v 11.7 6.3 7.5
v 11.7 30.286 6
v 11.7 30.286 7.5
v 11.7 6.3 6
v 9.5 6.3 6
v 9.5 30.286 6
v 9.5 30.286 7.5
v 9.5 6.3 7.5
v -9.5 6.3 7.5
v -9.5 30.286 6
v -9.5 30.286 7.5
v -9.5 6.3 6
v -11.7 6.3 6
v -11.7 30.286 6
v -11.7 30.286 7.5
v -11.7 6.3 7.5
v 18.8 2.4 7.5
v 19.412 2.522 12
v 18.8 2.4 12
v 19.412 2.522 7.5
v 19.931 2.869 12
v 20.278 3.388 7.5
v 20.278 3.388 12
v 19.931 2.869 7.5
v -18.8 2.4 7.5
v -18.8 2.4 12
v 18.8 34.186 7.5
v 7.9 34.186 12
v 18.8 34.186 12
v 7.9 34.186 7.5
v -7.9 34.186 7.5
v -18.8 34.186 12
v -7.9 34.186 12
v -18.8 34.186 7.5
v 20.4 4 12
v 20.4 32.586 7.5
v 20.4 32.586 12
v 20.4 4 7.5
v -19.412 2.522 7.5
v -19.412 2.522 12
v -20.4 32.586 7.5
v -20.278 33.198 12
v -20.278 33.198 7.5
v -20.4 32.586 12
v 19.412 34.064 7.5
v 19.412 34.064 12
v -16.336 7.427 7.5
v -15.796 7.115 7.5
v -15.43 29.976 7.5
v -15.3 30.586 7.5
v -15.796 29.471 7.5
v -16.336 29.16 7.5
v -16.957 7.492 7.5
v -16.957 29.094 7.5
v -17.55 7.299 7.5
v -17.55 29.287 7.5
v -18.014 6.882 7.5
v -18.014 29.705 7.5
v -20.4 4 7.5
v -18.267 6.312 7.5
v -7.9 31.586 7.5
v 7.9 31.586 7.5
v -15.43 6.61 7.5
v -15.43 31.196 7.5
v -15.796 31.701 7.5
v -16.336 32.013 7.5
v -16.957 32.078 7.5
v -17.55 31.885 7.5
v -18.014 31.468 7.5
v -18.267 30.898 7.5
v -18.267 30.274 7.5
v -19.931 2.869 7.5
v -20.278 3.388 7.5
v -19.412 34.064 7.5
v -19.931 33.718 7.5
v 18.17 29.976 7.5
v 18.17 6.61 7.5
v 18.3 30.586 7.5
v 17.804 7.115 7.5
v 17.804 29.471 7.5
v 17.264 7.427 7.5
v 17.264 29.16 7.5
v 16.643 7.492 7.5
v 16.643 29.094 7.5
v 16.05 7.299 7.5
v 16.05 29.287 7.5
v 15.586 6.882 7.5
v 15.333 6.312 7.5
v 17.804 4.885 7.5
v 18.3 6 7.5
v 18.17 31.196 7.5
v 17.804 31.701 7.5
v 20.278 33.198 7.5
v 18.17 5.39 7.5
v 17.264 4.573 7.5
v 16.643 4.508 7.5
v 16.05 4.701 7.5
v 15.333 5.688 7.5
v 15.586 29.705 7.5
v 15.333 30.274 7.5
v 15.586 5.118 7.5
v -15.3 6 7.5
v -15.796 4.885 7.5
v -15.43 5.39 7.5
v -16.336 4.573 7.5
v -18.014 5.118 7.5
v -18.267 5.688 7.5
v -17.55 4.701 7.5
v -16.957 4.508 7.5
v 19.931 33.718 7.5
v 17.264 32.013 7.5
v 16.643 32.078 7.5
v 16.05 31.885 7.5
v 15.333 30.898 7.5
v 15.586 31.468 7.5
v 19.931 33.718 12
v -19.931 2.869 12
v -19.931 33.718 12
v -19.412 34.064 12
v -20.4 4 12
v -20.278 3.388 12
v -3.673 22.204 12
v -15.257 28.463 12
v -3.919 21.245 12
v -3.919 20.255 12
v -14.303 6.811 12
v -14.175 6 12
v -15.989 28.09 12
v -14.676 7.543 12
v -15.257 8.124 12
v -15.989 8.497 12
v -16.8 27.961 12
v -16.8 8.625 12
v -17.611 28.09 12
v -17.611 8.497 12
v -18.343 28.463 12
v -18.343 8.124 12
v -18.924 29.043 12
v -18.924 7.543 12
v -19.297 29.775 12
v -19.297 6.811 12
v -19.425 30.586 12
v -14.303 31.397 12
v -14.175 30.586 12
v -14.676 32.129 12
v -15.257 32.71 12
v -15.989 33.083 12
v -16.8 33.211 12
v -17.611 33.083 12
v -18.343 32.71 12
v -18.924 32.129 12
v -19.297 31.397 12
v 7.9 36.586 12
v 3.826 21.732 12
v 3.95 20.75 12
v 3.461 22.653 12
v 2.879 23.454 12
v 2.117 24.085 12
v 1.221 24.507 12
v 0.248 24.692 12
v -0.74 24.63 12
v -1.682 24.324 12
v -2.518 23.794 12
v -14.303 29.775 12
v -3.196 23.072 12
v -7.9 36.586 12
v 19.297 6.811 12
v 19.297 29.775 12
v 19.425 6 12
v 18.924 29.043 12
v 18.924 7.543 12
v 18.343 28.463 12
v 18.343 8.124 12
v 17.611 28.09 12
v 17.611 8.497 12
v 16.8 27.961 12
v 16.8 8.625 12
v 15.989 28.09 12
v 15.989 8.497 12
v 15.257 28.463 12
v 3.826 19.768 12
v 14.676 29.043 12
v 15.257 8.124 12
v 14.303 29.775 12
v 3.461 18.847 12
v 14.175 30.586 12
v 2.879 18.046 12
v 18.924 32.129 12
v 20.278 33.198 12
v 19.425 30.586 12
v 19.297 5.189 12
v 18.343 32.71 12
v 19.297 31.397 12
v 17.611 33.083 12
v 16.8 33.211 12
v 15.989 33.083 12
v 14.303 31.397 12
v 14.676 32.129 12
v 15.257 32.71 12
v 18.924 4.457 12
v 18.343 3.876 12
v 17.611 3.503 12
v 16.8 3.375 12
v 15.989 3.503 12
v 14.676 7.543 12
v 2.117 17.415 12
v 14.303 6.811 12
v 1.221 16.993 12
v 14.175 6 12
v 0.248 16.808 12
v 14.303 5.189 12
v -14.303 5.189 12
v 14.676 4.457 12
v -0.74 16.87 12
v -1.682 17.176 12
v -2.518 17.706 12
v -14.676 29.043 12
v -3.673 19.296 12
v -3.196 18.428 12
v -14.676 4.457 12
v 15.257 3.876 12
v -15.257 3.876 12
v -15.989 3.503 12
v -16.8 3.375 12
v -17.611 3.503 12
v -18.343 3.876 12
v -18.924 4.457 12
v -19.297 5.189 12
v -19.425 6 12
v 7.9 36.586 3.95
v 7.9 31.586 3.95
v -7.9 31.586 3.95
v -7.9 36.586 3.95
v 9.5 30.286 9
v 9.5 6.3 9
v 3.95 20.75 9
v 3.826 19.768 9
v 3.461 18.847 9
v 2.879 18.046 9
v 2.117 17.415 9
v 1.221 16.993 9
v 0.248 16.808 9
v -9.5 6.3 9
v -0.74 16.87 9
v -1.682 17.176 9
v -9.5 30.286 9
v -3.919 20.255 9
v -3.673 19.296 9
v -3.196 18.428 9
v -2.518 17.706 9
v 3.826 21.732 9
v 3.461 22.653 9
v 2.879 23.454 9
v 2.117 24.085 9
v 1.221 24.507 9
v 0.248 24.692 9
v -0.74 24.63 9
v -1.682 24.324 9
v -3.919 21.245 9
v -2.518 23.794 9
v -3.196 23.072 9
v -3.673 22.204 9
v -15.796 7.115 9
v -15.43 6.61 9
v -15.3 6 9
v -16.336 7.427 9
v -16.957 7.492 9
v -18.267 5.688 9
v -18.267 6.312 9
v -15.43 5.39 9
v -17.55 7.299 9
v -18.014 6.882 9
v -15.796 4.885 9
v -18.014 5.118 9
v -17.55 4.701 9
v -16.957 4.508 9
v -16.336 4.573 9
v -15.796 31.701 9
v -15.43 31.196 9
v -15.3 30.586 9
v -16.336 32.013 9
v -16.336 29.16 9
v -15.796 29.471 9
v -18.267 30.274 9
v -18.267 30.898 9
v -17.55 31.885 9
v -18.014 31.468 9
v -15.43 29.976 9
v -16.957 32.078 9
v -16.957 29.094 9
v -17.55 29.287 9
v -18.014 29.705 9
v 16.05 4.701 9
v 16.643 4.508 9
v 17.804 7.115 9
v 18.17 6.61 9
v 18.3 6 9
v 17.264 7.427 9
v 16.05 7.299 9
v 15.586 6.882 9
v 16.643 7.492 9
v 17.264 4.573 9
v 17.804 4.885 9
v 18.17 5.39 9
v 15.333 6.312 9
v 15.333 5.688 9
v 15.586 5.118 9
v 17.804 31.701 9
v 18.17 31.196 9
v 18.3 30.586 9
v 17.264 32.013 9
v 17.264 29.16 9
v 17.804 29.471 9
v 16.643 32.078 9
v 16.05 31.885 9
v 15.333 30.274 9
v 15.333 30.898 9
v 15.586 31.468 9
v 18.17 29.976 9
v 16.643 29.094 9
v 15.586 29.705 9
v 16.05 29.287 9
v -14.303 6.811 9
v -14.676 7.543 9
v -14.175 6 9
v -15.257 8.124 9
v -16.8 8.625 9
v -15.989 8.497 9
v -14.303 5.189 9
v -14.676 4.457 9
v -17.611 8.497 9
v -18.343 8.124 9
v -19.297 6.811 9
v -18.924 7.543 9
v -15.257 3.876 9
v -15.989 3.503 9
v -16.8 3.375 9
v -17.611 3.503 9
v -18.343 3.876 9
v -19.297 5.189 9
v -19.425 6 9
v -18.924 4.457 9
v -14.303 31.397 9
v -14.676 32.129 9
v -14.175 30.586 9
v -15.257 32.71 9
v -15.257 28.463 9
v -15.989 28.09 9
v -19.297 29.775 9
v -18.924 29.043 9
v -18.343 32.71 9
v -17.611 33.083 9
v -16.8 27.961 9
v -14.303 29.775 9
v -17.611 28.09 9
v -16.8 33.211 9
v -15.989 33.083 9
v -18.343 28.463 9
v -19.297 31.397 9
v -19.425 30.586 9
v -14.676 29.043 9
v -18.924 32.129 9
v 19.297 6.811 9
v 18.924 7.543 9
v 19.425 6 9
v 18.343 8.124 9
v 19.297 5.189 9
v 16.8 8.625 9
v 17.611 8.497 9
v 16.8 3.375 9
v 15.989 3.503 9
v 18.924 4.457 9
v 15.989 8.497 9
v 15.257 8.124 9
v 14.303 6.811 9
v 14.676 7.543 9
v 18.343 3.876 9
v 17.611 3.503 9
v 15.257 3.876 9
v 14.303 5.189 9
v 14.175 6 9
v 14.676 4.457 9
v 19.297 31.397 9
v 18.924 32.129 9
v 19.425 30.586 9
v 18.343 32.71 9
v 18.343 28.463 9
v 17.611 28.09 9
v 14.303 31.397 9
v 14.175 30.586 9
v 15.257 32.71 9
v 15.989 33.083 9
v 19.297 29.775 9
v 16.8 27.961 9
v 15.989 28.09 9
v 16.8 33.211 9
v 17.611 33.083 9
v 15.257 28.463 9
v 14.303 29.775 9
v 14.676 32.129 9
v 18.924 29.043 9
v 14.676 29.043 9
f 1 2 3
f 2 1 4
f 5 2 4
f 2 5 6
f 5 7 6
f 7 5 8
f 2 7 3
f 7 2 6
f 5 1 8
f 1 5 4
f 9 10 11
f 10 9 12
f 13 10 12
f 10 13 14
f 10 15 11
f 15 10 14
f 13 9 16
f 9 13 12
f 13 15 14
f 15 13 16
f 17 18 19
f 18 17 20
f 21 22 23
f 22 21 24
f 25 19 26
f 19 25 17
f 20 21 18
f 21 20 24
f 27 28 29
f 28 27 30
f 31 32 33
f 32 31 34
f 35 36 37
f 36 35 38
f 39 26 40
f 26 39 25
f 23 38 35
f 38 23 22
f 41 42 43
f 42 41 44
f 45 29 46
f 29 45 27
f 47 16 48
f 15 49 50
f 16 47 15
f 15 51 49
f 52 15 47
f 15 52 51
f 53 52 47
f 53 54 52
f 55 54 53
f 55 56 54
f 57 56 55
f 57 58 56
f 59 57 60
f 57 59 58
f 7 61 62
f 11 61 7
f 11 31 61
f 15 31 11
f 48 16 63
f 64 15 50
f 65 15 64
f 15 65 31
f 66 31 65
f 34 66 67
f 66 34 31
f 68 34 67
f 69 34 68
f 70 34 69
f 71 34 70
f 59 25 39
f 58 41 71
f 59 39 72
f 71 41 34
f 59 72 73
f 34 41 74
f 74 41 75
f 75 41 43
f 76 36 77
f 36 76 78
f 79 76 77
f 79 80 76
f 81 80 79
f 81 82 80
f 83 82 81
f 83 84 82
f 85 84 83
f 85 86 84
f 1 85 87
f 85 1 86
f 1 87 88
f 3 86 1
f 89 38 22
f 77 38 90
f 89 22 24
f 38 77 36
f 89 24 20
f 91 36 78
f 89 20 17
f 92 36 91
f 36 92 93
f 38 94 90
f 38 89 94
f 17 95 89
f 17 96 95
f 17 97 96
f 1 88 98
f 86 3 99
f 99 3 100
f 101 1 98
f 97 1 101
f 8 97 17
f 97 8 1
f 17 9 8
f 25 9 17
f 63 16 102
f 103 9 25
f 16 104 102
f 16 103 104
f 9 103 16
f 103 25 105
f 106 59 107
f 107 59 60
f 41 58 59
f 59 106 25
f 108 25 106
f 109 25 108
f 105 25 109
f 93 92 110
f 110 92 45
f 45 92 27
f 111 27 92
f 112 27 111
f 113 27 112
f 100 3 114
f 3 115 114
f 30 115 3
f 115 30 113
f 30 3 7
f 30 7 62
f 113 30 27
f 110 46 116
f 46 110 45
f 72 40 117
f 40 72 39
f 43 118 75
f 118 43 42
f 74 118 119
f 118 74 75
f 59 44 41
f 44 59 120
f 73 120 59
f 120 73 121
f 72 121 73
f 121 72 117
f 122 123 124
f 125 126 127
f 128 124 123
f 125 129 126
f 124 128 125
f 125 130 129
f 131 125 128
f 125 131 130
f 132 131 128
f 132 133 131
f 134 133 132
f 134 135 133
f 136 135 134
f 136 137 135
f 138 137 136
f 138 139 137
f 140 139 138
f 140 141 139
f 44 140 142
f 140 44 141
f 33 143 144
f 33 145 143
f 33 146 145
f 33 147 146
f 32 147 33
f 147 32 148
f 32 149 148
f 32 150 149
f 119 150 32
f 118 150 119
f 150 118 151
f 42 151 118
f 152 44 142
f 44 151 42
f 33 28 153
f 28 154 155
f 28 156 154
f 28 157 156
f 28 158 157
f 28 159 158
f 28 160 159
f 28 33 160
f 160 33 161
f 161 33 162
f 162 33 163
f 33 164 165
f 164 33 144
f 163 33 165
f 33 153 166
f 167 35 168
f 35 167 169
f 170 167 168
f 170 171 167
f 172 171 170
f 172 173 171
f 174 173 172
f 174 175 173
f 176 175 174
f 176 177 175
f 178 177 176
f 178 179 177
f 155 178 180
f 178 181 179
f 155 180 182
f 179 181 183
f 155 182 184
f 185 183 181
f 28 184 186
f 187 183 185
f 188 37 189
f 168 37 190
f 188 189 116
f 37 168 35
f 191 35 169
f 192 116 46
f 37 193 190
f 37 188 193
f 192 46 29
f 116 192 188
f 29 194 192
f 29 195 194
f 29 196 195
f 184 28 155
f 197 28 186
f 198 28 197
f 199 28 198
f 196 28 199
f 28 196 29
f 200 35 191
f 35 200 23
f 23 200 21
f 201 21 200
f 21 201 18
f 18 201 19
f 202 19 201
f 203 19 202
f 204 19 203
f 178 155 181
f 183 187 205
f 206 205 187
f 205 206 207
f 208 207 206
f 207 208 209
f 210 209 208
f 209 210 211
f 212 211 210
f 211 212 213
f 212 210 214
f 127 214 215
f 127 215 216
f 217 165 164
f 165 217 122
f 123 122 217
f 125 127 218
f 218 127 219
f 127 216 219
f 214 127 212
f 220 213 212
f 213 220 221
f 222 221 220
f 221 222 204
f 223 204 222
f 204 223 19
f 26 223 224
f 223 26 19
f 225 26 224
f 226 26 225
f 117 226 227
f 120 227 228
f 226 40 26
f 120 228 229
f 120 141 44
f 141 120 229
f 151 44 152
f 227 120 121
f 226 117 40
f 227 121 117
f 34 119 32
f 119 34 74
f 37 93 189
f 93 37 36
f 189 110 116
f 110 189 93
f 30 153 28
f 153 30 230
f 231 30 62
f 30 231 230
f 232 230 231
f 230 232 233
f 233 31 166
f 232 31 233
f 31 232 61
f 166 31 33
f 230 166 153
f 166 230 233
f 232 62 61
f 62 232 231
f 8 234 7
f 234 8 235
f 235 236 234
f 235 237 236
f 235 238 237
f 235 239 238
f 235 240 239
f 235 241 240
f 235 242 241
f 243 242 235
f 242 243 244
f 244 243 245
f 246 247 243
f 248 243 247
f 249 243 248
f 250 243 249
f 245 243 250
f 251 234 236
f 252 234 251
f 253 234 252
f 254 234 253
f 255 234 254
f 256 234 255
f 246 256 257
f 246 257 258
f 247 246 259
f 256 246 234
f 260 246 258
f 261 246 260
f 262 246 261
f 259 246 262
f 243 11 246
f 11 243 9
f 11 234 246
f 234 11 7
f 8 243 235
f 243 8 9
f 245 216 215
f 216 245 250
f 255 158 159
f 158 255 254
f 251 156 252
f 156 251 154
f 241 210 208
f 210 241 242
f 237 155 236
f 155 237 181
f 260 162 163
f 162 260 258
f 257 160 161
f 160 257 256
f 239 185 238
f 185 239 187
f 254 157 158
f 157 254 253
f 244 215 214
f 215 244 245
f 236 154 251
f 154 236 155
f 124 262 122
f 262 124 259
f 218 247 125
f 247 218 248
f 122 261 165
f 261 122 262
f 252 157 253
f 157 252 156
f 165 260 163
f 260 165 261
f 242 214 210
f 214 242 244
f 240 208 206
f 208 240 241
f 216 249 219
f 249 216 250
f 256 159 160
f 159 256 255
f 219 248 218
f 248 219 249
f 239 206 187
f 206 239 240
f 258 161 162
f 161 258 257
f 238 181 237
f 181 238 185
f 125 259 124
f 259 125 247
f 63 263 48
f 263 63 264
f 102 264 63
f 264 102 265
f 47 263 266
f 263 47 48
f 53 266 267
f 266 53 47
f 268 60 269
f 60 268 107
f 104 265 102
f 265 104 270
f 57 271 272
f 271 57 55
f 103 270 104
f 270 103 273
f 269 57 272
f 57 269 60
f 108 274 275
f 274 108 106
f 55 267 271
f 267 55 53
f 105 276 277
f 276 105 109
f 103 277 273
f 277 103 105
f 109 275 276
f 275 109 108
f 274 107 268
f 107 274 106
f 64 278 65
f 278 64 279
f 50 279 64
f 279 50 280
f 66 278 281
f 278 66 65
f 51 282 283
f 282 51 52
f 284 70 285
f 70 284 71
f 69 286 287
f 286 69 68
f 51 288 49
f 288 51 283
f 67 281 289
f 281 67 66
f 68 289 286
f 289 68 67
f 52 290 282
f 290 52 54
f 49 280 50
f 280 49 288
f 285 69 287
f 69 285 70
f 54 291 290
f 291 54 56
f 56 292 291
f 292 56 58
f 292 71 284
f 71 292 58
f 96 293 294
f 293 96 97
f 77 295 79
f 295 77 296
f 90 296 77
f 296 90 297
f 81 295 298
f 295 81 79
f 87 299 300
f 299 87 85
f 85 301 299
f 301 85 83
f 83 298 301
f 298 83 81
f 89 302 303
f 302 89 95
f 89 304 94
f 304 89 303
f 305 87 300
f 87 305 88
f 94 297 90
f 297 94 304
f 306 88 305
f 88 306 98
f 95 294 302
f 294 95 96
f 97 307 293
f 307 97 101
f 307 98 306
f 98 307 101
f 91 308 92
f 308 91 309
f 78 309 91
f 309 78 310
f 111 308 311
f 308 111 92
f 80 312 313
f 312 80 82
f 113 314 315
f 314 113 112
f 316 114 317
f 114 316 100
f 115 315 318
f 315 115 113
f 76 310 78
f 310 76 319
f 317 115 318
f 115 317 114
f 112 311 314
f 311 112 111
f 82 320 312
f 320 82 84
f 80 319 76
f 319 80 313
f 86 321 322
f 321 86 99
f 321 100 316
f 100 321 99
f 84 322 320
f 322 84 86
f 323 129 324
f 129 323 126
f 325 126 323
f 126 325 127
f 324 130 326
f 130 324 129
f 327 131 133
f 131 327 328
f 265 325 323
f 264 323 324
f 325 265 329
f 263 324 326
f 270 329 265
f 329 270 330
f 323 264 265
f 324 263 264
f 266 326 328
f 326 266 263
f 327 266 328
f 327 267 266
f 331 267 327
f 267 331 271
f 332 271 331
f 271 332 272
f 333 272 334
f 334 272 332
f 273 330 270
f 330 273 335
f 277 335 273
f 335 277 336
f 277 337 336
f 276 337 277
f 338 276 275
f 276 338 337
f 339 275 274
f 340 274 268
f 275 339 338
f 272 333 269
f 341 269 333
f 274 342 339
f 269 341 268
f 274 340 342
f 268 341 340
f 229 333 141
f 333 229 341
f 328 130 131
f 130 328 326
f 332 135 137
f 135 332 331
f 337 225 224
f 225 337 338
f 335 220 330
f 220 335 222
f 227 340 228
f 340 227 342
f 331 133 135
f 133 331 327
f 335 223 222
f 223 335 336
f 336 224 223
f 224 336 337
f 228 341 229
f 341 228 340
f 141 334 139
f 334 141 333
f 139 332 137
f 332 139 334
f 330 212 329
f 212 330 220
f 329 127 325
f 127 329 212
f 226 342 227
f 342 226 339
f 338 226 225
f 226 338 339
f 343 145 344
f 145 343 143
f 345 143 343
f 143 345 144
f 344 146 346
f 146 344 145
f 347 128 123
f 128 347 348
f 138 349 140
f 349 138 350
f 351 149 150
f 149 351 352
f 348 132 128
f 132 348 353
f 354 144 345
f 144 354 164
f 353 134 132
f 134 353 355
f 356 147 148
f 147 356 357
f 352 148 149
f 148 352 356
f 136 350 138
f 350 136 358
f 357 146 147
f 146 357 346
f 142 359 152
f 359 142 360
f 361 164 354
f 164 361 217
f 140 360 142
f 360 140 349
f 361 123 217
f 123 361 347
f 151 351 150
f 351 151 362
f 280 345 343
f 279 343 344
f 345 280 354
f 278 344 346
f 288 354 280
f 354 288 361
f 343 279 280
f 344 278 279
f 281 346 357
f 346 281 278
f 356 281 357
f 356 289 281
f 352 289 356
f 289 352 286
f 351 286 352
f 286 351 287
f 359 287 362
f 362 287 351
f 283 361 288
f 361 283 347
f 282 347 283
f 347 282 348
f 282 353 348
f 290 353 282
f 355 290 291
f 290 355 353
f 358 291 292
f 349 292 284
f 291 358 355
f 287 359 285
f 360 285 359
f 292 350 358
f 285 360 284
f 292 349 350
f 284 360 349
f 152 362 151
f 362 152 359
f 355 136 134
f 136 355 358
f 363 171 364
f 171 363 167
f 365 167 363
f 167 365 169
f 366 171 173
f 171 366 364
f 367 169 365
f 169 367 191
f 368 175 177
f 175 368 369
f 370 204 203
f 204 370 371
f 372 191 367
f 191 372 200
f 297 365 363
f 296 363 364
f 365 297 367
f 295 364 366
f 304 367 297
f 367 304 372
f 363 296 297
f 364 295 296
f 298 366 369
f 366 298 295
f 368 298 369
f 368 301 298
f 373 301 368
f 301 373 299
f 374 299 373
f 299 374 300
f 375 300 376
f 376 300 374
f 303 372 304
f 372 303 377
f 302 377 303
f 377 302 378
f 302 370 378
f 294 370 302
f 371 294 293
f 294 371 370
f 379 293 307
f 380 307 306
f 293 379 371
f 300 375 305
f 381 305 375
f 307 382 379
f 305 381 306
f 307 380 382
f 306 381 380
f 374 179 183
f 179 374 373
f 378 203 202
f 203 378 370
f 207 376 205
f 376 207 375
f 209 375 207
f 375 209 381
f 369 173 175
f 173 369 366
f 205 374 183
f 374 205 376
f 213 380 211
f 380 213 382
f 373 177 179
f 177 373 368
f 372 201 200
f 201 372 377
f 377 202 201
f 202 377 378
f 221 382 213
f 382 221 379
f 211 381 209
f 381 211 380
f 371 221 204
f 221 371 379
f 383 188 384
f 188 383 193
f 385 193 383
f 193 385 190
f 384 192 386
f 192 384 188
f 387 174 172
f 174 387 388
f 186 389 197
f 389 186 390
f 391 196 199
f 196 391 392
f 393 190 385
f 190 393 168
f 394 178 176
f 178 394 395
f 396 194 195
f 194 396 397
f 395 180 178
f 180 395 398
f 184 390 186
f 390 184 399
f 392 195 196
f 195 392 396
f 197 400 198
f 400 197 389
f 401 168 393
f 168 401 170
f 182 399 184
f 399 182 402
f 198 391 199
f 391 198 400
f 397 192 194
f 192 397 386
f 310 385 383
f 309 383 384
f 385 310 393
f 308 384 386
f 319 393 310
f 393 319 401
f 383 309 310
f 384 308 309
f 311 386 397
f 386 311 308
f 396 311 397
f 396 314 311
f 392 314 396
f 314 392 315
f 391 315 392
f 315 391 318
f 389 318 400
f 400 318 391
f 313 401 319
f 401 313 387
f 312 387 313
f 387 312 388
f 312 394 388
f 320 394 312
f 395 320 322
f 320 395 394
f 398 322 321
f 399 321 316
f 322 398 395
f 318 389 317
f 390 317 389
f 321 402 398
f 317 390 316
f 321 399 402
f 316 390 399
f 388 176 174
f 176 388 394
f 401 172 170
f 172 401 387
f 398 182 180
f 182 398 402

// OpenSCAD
// file: settings.scad
// Shared OpenScad configuration for building a stacked mounting adapter
// that packages the following devices:
//
// * Top: A IR LED ring light
// * Mid: A IR BandPass filter that allows light through
// * Bot: A Raspberry Pi NoIR camera v2.1 that allows IR light through to sensor
//
// This file contains settings for the mounting hardware

// Diameter (in mm) of your custom mounting hardware (to attach your
// devices together). 3.0 mm works for 2.5M bolts (and probably #4).
bolt_hole_diameter = 3.0;

// The diameter for any counter sunk holes for bolt heads
bolt_head_diameter = 5.25;

// The depth to counter sink holes for bolt heads
bolt_head_depth = 2.5;

// The width measured using calipers across two flat edges plus
// some room depending on your printer (maybe 0.25 to 0.5)
nut_width = 5.25;

// The minimum depth to counter sink a hex hole for a nut
nut_depth = 2.25;


plate_diameter = 78;
plate_holes = 24;
plate_holes_diameter = 70;

// The minimum acceptable plate thickness (in mm) you want
// when two plates come together to be bolted.
plate_thickness = 1.5;

// How many rotated positions do you want for your mounting holes (integer).
num_angles = 4;

// Detail to use when drawing circles/arcs (higher values look more like
// circles but take longer to render)
$fn = 16;
// main file
//
// The cover that can traps the camera to the back plate.
//

include <common.scad>;

$fn = 64;
cover();
